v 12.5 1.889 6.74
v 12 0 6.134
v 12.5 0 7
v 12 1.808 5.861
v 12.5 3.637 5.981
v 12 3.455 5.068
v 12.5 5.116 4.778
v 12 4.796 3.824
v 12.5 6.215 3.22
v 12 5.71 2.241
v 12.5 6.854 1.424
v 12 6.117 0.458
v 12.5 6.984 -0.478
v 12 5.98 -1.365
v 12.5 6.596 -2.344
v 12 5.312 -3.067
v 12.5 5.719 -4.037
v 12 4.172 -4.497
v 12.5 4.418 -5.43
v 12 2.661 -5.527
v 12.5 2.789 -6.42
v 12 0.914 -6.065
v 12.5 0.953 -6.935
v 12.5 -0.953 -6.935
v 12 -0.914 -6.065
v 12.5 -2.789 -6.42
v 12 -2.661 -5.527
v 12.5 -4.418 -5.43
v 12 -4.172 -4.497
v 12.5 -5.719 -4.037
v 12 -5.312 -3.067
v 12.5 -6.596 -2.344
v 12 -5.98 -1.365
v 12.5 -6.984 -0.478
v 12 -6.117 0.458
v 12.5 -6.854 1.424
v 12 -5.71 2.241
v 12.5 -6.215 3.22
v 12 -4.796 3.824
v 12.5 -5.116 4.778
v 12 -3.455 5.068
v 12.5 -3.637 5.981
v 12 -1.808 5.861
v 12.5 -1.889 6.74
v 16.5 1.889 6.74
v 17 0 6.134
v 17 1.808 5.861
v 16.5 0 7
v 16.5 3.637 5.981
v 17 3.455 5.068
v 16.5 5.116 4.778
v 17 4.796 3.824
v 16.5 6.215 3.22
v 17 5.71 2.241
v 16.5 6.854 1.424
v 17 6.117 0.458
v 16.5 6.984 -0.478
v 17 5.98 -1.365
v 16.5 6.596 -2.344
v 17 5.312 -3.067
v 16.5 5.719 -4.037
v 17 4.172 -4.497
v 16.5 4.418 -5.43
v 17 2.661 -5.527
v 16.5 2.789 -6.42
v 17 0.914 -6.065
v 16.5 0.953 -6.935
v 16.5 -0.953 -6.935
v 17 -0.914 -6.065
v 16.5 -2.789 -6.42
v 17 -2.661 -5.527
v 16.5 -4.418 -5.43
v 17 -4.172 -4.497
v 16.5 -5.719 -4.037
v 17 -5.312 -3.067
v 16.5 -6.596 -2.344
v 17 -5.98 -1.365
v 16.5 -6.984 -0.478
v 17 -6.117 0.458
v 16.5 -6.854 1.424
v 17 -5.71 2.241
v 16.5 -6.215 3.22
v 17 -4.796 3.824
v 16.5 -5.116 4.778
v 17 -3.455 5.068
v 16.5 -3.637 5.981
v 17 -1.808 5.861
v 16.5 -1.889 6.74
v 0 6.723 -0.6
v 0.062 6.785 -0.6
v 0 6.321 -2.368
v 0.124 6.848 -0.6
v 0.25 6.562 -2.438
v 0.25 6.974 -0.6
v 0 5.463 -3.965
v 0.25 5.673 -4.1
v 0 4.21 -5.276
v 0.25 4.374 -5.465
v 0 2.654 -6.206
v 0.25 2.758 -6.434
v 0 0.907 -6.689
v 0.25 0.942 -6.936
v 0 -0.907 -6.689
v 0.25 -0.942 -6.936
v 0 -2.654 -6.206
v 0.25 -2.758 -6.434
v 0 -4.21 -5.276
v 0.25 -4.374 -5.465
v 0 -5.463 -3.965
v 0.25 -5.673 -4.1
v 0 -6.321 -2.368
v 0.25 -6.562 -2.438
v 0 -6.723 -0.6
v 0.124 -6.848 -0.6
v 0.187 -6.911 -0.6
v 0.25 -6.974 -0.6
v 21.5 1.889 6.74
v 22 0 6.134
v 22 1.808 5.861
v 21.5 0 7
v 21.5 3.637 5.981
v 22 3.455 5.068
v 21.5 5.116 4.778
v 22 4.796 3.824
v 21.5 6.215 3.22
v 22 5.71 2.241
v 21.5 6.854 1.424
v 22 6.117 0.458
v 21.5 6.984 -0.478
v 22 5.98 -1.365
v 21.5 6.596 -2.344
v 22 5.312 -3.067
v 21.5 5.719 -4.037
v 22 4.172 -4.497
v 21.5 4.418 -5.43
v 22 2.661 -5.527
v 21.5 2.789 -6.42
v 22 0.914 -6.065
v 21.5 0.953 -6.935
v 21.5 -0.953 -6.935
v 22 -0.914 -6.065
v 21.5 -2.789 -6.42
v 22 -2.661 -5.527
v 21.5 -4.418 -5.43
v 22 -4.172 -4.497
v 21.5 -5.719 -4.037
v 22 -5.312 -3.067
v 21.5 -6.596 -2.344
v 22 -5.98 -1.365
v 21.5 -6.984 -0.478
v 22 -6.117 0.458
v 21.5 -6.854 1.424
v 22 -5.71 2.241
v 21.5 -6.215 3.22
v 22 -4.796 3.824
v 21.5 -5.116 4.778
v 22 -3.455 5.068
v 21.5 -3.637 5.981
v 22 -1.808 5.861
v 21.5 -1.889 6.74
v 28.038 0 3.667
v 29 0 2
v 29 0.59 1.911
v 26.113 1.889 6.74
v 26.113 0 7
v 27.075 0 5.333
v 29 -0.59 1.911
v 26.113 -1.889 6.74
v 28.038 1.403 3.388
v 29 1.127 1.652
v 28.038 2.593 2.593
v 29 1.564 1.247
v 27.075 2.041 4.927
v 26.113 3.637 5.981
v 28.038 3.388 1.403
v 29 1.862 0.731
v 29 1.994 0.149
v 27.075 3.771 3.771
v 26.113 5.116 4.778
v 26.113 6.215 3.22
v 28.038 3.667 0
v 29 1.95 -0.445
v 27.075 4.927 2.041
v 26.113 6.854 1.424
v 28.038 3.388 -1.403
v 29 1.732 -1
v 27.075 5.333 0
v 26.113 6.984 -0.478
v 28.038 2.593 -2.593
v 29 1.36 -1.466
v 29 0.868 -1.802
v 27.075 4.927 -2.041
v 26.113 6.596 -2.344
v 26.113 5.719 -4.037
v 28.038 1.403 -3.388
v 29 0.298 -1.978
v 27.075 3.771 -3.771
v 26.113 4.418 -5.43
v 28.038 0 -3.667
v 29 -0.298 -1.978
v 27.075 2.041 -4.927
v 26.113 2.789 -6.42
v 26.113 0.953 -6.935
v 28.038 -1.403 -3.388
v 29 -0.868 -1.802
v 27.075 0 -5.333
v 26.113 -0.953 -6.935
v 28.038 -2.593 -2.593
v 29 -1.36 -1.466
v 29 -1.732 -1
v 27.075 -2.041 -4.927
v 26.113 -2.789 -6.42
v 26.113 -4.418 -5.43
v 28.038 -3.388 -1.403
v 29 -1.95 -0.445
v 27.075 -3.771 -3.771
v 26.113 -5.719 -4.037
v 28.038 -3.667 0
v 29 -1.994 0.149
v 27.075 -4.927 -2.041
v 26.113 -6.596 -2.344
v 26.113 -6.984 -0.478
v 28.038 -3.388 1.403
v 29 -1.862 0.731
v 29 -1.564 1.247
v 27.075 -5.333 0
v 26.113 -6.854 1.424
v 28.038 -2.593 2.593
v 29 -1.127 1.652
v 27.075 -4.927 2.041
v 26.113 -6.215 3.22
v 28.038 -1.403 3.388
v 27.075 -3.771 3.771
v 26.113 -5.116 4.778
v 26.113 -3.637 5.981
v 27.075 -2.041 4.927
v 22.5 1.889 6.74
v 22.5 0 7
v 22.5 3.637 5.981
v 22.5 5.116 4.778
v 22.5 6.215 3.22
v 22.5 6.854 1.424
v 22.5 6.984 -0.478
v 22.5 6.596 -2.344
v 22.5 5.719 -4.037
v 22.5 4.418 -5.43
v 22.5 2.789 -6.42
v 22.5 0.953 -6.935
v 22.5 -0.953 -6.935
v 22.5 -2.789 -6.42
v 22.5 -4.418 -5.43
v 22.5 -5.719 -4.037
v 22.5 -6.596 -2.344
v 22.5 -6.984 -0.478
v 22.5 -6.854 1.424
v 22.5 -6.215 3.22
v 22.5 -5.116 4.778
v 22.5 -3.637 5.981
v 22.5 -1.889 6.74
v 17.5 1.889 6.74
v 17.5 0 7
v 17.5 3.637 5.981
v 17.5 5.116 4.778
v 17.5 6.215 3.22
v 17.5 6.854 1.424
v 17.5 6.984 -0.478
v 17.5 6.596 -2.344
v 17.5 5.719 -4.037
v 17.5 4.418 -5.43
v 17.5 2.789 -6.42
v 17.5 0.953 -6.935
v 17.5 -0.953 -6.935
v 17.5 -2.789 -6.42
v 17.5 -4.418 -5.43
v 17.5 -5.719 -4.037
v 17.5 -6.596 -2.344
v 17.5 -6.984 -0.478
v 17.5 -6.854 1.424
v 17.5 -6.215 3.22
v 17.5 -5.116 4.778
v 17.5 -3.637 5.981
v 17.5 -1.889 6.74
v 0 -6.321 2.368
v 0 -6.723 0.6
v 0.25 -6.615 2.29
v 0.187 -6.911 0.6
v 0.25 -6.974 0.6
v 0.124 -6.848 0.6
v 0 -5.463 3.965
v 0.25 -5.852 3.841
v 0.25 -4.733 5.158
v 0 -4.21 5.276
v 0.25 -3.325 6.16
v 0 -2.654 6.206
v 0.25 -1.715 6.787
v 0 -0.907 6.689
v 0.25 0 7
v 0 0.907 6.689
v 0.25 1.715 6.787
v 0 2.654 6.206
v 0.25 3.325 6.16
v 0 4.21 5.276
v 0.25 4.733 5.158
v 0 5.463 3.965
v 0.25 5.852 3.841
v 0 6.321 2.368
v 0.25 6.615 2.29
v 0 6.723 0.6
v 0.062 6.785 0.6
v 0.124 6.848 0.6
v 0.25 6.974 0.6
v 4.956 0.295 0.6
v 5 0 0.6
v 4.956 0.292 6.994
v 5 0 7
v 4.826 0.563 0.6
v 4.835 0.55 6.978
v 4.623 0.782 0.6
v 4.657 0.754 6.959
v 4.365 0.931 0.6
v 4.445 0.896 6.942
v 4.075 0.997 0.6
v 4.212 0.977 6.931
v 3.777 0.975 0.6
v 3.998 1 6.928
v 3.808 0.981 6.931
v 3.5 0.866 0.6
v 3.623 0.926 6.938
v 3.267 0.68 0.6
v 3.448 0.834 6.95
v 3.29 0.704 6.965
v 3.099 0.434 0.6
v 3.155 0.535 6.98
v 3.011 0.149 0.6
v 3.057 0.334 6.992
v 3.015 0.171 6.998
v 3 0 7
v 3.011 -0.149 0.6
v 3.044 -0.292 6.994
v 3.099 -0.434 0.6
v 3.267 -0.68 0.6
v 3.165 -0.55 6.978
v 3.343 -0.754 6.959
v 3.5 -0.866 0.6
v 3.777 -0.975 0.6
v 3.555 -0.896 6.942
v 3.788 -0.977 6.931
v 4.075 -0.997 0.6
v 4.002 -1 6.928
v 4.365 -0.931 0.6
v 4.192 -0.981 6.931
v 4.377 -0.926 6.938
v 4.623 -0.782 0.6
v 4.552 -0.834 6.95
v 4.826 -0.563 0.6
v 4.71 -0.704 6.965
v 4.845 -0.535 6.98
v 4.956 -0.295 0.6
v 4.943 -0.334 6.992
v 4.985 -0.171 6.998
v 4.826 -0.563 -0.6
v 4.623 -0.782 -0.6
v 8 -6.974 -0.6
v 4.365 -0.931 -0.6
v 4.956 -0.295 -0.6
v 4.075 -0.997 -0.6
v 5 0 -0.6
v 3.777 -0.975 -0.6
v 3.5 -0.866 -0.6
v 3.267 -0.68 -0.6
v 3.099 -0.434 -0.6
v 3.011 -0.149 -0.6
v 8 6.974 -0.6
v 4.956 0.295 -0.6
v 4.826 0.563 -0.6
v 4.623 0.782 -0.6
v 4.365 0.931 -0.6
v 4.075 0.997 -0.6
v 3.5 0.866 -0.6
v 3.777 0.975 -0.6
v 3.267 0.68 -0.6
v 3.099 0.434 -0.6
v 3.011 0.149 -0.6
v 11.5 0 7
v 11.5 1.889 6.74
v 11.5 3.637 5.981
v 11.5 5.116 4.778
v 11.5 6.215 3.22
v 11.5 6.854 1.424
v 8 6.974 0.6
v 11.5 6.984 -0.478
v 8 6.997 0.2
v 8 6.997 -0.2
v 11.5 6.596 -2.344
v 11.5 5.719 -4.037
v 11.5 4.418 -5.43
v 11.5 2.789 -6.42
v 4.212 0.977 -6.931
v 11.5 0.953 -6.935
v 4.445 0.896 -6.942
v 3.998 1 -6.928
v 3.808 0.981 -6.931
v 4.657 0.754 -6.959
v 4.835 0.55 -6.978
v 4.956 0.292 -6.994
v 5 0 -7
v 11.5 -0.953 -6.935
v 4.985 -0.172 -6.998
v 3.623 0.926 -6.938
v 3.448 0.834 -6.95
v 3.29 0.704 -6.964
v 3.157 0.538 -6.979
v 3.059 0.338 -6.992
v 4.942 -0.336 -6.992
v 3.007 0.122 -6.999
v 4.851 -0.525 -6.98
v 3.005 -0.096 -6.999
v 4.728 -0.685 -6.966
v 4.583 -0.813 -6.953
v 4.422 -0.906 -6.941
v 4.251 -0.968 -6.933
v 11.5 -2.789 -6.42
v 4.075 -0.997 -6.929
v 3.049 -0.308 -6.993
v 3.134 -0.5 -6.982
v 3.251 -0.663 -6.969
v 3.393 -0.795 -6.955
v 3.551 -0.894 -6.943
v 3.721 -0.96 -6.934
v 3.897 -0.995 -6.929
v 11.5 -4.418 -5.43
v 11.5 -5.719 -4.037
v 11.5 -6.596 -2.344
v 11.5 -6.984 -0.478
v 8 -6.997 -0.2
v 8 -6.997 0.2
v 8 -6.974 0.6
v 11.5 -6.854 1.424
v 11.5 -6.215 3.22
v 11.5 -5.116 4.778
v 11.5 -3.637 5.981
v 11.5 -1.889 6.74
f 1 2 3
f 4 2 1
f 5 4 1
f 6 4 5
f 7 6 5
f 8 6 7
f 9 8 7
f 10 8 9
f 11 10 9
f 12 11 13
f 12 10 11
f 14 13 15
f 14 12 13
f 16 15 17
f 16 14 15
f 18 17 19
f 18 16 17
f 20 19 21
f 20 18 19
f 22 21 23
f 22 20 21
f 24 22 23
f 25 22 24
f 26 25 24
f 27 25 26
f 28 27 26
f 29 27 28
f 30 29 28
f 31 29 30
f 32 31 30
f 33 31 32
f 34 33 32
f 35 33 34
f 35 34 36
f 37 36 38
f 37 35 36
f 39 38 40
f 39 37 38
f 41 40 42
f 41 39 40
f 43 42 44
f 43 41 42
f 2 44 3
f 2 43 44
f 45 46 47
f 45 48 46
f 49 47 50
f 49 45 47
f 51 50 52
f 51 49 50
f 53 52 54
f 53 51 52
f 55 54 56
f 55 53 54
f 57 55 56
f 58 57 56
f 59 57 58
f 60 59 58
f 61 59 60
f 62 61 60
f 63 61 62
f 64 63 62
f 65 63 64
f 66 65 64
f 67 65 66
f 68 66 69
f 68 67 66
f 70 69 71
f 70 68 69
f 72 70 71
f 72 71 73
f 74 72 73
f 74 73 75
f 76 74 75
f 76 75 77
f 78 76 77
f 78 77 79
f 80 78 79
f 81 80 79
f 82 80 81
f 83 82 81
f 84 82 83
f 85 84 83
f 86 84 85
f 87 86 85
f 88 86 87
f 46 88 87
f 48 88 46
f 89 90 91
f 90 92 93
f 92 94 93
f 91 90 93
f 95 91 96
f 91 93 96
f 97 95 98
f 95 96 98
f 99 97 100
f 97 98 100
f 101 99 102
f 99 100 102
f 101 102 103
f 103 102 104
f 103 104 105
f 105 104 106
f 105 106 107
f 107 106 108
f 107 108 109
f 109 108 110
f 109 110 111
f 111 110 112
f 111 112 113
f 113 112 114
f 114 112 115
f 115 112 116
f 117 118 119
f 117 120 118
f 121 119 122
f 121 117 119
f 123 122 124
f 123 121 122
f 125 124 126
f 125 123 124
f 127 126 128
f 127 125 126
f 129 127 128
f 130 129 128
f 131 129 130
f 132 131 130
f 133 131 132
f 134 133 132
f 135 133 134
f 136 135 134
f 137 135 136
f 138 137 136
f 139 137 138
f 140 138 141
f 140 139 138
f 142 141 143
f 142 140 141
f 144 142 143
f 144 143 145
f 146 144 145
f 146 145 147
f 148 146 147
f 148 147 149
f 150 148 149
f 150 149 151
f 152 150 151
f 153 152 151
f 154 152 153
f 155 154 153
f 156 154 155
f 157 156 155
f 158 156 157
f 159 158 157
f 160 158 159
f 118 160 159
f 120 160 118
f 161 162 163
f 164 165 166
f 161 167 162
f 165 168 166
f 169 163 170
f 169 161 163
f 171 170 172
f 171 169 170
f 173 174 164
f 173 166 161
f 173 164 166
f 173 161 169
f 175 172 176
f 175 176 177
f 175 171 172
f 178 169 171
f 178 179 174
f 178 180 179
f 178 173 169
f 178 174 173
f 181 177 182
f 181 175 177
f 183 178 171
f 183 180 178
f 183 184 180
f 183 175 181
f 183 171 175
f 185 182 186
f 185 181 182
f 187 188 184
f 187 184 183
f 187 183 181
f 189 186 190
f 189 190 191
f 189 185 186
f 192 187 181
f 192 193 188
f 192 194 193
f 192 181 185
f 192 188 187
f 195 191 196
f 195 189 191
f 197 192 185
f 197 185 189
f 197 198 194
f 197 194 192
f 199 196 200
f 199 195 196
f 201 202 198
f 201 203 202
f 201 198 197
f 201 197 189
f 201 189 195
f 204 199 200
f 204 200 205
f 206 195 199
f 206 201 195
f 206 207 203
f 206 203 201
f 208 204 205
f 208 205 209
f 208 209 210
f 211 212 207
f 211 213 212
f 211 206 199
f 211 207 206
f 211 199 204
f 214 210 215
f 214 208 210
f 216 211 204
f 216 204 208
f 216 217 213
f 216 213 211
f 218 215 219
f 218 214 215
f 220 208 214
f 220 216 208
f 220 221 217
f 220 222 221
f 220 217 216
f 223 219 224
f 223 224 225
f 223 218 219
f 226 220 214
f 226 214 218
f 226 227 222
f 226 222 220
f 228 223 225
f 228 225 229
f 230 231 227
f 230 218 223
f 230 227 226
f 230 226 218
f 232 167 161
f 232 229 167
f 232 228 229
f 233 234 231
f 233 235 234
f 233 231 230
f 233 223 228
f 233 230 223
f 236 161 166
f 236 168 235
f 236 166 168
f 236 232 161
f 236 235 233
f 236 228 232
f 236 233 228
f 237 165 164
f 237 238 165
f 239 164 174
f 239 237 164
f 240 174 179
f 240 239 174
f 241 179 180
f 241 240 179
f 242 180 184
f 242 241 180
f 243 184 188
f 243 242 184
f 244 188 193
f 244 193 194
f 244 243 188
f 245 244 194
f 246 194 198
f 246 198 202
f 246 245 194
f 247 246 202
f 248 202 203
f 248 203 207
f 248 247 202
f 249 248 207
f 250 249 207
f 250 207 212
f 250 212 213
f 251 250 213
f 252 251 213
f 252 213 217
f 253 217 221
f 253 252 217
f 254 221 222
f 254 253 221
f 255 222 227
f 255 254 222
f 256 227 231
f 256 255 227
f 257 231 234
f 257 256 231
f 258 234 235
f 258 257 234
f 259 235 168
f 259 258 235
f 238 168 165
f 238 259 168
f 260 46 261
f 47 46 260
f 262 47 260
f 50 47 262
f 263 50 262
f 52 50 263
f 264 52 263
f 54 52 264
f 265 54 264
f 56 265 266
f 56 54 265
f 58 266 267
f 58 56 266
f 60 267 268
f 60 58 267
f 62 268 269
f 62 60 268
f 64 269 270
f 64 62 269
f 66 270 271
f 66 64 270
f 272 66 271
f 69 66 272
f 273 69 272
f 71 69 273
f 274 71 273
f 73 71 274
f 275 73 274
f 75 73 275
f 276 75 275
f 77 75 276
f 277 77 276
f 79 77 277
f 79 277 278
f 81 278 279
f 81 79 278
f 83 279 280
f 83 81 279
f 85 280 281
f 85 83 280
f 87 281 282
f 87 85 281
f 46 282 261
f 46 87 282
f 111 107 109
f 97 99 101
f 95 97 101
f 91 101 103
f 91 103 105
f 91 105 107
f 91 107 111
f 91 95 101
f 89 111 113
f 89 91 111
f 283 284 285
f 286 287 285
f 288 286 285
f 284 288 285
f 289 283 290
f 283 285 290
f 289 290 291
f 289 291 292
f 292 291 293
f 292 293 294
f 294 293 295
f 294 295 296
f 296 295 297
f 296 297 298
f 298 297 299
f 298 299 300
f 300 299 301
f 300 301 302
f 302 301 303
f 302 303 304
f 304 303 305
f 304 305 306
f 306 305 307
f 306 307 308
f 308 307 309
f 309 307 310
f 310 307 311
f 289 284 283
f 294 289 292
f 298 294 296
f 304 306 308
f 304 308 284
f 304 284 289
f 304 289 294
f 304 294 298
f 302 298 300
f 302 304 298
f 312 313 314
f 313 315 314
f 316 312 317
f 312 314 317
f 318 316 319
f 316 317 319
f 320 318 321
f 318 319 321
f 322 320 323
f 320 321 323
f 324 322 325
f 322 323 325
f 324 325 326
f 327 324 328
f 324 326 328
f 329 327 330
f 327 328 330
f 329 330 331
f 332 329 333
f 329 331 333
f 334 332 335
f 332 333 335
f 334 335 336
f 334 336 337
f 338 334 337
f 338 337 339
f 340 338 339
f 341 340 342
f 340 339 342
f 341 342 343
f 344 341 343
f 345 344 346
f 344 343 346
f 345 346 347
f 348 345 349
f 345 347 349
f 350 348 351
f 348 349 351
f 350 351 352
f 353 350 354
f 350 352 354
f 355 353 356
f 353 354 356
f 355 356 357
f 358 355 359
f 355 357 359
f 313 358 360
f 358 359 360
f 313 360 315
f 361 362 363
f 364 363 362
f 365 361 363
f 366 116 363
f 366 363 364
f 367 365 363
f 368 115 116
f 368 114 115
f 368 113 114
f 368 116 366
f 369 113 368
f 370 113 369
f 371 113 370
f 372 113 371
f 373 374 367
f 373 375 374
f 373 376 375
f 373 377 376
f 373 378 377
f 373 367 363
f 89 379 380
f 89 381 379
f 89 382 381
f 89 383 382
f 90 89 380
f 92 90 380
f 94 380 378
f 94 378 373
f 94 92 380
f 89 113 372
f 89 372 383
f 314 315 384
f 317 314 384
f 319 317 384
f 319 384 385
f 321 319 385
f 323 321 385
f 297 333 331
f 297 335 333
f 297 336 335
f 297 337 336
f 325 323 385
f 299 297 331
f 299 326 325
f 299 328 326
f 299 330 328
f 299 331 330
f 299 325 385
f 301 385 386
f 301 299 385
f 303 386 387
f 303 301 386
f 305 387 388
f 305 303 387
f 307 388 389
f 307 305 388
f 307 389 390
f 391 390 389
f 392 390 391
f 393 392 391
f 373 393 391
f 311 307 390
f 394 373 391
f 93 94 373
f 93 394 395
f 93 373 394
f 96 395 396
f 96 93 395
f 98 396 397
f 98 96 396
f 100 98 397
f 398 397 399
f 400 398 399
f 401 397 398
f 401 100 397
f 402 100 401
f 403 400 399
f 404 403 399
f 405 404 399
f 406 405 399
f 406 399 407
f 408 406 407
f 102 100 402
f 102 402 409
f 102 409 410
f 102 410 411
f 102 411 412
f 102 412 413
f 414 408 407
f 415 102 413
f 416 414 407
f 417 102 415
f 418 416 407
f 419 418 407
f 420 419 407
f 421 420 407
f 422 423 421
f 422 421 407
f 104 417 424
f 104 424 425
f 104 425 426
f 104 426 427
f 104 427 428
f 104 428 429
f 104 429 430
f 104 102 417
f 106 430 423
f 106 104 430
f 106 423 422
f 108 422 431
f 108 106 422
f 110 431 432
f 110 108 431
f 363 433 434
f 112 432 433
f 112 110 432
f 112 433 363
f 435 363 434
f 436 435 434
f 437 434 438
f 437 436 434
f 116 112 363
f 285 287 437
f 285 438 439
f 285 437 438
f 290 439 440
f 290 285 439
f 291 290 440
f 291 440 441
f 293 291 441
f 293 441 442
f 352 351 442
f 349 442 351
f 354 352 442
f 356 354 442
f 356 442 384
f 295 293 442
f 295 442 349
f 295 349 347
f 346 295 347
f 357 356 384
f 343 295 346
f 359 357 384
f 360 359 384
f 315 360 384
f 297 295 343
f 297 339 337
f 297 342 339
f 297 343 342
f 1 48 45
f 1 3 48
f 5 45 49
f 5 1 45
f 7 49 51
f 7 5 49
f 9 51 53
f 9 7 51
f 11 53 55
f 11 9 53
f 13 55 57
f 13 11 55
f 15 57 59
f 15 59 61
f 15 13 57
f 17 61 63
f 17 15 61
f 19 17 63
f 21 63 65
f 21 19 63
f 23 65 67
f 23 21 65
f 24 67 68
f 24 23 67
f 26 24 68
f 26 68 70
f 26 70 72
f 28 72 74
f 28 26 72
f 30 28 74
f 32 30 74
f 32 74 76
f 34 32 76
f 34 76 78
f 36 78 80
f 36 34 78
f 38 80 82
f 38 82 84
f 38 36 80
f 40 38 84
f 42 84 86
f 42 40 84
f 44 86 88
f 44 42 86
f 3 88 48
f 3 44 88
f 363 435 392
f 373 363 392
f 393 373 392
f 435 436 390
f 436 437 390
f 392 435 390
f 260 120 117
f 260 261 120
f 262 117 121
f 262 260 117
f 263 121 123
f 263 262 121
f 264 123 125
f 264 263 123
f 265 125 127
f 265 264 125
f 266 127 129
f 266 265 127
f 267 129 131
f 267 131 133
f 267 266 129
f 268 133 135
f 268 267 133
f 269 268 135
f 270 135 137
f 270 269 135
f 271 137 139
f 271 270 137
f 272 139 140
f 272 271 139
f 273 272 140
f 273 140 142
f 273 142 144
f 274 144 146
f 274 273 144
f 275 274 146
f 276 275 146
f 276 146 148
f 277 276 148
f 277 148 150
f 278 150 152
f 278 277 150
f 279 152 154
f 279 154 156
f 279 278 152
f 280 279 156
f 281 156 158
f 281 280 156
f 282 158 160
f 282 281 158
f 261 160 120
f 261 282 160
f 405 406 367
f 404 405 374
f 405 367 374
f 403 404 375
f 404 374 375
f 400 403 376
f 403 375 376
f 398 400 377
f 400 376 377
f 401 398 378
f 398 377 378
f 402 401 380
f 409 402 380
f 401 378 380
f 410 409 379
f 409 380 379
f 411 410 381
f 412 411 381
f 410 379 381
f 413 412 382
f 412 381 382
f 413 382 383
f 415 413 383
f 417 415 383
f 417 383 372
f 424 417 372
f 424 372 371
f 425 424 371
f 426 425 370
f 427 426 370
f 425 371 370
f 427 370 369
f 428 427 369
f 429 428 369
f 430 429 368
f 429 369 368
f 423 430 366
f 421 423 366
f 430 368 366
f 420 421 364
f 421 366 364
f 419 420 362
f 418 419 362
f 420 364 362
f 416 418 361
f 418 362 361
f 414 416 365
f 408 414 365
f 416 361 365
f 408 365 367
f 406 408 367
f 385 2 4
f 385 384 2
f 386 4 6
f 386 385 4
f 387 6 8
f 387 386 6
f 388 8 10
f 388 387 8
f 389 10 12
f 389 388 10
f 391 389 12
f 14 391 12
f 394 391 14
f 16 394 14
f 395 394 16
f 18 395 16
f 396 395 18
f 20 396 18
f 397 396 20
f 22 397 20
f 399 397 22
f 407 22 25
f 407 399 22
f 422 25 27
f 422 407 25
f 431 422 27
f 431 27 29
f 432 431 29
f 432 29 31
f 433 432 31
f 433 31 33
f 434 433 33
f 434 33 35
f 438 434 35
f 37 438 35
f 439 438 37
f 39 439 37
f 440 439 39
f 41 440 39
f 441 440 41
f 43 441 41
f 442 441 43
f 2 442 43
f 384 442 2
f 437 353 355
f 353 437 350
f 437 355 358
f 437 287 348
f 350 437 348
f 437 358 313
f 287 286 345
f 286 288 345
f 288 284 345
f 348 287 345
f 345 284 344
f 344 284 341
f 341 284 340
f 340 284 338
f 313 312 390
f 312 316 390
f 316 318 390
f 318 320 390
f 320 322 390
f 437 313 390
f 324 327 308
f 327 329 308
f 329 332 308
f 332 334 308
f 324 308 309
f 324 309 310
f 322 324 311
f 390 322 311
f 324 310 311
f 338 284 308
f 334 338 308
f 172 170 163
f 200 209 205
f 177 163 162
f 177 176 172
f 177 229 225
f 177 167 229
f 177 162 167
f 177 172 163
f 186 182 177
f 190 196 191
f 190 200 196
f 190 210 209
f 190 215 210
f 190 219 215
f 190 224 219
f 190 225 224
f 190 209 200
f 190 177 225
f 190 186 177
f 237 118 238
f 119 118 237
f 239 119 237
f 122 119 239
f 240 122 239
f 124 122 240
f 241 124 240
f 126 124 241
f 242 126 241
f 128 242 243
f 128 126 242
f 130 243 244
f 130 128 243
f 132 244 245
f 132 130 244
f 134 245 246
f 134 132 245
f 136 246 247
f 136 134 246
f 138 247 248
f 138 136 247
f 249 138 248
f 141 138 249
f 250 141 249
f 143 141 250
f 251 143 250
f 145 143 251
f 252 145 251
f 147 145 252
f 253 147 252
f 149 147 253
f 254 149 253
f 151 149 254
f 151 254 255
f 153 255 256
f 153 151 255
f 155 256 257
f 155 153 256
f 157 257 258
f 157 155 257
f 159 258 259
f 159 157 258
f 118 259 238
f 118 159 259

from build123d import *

# Parameters (mm, degrees)
F2_SIZE  = 0.25
F3_W     = 15
F3_H     = 1.2
F4_DEPTH = 8
F5_R     = 1
F6_DEPTH = 12.5


with BuildPart() as f1:
    # F0 (on Front) → F1 (revolve)
    with BuildSketch(Plane.XZ):
        Polygon((0, 7), (0, 0), (29, 0), (29, 2), (26.113249, 7), (22.5, 7), (22, 6.133975), (21.5, 7), (17.5, 7), (17, 6.133975), (16.5, 7), (12.5, 7), (12, 6.133975), (11.5, 7), align=None)
    revolve(axis=Axis((14.5, 0, 0), (-1, 0, 0)))

    # F2
    f2_edges = [f1.edges().sort_by_distance(p)[0] for p in [
        (0, 0, -7),
    ]]
    chamfer(f2_edges, length=F2_SIZE)

    # F3 (on Right) → F4 (cut)
    with BuildSketch(Plane.YZ):
        Rectangle(F3_W, F3_H)
    extrude(amount=F4_DEPTH, mode=Mode.SUBTRACT)

    # F5 (on Top) → F6 (cut, symmetric)
    with BuildSketch(Plane.XY):
        with Locations((4, 0)):
            Circle(F5_R)
    extrude(amount=F6_DEPTH, both=True, mode=Mode.SUBTRACT)


solid = f1.part
